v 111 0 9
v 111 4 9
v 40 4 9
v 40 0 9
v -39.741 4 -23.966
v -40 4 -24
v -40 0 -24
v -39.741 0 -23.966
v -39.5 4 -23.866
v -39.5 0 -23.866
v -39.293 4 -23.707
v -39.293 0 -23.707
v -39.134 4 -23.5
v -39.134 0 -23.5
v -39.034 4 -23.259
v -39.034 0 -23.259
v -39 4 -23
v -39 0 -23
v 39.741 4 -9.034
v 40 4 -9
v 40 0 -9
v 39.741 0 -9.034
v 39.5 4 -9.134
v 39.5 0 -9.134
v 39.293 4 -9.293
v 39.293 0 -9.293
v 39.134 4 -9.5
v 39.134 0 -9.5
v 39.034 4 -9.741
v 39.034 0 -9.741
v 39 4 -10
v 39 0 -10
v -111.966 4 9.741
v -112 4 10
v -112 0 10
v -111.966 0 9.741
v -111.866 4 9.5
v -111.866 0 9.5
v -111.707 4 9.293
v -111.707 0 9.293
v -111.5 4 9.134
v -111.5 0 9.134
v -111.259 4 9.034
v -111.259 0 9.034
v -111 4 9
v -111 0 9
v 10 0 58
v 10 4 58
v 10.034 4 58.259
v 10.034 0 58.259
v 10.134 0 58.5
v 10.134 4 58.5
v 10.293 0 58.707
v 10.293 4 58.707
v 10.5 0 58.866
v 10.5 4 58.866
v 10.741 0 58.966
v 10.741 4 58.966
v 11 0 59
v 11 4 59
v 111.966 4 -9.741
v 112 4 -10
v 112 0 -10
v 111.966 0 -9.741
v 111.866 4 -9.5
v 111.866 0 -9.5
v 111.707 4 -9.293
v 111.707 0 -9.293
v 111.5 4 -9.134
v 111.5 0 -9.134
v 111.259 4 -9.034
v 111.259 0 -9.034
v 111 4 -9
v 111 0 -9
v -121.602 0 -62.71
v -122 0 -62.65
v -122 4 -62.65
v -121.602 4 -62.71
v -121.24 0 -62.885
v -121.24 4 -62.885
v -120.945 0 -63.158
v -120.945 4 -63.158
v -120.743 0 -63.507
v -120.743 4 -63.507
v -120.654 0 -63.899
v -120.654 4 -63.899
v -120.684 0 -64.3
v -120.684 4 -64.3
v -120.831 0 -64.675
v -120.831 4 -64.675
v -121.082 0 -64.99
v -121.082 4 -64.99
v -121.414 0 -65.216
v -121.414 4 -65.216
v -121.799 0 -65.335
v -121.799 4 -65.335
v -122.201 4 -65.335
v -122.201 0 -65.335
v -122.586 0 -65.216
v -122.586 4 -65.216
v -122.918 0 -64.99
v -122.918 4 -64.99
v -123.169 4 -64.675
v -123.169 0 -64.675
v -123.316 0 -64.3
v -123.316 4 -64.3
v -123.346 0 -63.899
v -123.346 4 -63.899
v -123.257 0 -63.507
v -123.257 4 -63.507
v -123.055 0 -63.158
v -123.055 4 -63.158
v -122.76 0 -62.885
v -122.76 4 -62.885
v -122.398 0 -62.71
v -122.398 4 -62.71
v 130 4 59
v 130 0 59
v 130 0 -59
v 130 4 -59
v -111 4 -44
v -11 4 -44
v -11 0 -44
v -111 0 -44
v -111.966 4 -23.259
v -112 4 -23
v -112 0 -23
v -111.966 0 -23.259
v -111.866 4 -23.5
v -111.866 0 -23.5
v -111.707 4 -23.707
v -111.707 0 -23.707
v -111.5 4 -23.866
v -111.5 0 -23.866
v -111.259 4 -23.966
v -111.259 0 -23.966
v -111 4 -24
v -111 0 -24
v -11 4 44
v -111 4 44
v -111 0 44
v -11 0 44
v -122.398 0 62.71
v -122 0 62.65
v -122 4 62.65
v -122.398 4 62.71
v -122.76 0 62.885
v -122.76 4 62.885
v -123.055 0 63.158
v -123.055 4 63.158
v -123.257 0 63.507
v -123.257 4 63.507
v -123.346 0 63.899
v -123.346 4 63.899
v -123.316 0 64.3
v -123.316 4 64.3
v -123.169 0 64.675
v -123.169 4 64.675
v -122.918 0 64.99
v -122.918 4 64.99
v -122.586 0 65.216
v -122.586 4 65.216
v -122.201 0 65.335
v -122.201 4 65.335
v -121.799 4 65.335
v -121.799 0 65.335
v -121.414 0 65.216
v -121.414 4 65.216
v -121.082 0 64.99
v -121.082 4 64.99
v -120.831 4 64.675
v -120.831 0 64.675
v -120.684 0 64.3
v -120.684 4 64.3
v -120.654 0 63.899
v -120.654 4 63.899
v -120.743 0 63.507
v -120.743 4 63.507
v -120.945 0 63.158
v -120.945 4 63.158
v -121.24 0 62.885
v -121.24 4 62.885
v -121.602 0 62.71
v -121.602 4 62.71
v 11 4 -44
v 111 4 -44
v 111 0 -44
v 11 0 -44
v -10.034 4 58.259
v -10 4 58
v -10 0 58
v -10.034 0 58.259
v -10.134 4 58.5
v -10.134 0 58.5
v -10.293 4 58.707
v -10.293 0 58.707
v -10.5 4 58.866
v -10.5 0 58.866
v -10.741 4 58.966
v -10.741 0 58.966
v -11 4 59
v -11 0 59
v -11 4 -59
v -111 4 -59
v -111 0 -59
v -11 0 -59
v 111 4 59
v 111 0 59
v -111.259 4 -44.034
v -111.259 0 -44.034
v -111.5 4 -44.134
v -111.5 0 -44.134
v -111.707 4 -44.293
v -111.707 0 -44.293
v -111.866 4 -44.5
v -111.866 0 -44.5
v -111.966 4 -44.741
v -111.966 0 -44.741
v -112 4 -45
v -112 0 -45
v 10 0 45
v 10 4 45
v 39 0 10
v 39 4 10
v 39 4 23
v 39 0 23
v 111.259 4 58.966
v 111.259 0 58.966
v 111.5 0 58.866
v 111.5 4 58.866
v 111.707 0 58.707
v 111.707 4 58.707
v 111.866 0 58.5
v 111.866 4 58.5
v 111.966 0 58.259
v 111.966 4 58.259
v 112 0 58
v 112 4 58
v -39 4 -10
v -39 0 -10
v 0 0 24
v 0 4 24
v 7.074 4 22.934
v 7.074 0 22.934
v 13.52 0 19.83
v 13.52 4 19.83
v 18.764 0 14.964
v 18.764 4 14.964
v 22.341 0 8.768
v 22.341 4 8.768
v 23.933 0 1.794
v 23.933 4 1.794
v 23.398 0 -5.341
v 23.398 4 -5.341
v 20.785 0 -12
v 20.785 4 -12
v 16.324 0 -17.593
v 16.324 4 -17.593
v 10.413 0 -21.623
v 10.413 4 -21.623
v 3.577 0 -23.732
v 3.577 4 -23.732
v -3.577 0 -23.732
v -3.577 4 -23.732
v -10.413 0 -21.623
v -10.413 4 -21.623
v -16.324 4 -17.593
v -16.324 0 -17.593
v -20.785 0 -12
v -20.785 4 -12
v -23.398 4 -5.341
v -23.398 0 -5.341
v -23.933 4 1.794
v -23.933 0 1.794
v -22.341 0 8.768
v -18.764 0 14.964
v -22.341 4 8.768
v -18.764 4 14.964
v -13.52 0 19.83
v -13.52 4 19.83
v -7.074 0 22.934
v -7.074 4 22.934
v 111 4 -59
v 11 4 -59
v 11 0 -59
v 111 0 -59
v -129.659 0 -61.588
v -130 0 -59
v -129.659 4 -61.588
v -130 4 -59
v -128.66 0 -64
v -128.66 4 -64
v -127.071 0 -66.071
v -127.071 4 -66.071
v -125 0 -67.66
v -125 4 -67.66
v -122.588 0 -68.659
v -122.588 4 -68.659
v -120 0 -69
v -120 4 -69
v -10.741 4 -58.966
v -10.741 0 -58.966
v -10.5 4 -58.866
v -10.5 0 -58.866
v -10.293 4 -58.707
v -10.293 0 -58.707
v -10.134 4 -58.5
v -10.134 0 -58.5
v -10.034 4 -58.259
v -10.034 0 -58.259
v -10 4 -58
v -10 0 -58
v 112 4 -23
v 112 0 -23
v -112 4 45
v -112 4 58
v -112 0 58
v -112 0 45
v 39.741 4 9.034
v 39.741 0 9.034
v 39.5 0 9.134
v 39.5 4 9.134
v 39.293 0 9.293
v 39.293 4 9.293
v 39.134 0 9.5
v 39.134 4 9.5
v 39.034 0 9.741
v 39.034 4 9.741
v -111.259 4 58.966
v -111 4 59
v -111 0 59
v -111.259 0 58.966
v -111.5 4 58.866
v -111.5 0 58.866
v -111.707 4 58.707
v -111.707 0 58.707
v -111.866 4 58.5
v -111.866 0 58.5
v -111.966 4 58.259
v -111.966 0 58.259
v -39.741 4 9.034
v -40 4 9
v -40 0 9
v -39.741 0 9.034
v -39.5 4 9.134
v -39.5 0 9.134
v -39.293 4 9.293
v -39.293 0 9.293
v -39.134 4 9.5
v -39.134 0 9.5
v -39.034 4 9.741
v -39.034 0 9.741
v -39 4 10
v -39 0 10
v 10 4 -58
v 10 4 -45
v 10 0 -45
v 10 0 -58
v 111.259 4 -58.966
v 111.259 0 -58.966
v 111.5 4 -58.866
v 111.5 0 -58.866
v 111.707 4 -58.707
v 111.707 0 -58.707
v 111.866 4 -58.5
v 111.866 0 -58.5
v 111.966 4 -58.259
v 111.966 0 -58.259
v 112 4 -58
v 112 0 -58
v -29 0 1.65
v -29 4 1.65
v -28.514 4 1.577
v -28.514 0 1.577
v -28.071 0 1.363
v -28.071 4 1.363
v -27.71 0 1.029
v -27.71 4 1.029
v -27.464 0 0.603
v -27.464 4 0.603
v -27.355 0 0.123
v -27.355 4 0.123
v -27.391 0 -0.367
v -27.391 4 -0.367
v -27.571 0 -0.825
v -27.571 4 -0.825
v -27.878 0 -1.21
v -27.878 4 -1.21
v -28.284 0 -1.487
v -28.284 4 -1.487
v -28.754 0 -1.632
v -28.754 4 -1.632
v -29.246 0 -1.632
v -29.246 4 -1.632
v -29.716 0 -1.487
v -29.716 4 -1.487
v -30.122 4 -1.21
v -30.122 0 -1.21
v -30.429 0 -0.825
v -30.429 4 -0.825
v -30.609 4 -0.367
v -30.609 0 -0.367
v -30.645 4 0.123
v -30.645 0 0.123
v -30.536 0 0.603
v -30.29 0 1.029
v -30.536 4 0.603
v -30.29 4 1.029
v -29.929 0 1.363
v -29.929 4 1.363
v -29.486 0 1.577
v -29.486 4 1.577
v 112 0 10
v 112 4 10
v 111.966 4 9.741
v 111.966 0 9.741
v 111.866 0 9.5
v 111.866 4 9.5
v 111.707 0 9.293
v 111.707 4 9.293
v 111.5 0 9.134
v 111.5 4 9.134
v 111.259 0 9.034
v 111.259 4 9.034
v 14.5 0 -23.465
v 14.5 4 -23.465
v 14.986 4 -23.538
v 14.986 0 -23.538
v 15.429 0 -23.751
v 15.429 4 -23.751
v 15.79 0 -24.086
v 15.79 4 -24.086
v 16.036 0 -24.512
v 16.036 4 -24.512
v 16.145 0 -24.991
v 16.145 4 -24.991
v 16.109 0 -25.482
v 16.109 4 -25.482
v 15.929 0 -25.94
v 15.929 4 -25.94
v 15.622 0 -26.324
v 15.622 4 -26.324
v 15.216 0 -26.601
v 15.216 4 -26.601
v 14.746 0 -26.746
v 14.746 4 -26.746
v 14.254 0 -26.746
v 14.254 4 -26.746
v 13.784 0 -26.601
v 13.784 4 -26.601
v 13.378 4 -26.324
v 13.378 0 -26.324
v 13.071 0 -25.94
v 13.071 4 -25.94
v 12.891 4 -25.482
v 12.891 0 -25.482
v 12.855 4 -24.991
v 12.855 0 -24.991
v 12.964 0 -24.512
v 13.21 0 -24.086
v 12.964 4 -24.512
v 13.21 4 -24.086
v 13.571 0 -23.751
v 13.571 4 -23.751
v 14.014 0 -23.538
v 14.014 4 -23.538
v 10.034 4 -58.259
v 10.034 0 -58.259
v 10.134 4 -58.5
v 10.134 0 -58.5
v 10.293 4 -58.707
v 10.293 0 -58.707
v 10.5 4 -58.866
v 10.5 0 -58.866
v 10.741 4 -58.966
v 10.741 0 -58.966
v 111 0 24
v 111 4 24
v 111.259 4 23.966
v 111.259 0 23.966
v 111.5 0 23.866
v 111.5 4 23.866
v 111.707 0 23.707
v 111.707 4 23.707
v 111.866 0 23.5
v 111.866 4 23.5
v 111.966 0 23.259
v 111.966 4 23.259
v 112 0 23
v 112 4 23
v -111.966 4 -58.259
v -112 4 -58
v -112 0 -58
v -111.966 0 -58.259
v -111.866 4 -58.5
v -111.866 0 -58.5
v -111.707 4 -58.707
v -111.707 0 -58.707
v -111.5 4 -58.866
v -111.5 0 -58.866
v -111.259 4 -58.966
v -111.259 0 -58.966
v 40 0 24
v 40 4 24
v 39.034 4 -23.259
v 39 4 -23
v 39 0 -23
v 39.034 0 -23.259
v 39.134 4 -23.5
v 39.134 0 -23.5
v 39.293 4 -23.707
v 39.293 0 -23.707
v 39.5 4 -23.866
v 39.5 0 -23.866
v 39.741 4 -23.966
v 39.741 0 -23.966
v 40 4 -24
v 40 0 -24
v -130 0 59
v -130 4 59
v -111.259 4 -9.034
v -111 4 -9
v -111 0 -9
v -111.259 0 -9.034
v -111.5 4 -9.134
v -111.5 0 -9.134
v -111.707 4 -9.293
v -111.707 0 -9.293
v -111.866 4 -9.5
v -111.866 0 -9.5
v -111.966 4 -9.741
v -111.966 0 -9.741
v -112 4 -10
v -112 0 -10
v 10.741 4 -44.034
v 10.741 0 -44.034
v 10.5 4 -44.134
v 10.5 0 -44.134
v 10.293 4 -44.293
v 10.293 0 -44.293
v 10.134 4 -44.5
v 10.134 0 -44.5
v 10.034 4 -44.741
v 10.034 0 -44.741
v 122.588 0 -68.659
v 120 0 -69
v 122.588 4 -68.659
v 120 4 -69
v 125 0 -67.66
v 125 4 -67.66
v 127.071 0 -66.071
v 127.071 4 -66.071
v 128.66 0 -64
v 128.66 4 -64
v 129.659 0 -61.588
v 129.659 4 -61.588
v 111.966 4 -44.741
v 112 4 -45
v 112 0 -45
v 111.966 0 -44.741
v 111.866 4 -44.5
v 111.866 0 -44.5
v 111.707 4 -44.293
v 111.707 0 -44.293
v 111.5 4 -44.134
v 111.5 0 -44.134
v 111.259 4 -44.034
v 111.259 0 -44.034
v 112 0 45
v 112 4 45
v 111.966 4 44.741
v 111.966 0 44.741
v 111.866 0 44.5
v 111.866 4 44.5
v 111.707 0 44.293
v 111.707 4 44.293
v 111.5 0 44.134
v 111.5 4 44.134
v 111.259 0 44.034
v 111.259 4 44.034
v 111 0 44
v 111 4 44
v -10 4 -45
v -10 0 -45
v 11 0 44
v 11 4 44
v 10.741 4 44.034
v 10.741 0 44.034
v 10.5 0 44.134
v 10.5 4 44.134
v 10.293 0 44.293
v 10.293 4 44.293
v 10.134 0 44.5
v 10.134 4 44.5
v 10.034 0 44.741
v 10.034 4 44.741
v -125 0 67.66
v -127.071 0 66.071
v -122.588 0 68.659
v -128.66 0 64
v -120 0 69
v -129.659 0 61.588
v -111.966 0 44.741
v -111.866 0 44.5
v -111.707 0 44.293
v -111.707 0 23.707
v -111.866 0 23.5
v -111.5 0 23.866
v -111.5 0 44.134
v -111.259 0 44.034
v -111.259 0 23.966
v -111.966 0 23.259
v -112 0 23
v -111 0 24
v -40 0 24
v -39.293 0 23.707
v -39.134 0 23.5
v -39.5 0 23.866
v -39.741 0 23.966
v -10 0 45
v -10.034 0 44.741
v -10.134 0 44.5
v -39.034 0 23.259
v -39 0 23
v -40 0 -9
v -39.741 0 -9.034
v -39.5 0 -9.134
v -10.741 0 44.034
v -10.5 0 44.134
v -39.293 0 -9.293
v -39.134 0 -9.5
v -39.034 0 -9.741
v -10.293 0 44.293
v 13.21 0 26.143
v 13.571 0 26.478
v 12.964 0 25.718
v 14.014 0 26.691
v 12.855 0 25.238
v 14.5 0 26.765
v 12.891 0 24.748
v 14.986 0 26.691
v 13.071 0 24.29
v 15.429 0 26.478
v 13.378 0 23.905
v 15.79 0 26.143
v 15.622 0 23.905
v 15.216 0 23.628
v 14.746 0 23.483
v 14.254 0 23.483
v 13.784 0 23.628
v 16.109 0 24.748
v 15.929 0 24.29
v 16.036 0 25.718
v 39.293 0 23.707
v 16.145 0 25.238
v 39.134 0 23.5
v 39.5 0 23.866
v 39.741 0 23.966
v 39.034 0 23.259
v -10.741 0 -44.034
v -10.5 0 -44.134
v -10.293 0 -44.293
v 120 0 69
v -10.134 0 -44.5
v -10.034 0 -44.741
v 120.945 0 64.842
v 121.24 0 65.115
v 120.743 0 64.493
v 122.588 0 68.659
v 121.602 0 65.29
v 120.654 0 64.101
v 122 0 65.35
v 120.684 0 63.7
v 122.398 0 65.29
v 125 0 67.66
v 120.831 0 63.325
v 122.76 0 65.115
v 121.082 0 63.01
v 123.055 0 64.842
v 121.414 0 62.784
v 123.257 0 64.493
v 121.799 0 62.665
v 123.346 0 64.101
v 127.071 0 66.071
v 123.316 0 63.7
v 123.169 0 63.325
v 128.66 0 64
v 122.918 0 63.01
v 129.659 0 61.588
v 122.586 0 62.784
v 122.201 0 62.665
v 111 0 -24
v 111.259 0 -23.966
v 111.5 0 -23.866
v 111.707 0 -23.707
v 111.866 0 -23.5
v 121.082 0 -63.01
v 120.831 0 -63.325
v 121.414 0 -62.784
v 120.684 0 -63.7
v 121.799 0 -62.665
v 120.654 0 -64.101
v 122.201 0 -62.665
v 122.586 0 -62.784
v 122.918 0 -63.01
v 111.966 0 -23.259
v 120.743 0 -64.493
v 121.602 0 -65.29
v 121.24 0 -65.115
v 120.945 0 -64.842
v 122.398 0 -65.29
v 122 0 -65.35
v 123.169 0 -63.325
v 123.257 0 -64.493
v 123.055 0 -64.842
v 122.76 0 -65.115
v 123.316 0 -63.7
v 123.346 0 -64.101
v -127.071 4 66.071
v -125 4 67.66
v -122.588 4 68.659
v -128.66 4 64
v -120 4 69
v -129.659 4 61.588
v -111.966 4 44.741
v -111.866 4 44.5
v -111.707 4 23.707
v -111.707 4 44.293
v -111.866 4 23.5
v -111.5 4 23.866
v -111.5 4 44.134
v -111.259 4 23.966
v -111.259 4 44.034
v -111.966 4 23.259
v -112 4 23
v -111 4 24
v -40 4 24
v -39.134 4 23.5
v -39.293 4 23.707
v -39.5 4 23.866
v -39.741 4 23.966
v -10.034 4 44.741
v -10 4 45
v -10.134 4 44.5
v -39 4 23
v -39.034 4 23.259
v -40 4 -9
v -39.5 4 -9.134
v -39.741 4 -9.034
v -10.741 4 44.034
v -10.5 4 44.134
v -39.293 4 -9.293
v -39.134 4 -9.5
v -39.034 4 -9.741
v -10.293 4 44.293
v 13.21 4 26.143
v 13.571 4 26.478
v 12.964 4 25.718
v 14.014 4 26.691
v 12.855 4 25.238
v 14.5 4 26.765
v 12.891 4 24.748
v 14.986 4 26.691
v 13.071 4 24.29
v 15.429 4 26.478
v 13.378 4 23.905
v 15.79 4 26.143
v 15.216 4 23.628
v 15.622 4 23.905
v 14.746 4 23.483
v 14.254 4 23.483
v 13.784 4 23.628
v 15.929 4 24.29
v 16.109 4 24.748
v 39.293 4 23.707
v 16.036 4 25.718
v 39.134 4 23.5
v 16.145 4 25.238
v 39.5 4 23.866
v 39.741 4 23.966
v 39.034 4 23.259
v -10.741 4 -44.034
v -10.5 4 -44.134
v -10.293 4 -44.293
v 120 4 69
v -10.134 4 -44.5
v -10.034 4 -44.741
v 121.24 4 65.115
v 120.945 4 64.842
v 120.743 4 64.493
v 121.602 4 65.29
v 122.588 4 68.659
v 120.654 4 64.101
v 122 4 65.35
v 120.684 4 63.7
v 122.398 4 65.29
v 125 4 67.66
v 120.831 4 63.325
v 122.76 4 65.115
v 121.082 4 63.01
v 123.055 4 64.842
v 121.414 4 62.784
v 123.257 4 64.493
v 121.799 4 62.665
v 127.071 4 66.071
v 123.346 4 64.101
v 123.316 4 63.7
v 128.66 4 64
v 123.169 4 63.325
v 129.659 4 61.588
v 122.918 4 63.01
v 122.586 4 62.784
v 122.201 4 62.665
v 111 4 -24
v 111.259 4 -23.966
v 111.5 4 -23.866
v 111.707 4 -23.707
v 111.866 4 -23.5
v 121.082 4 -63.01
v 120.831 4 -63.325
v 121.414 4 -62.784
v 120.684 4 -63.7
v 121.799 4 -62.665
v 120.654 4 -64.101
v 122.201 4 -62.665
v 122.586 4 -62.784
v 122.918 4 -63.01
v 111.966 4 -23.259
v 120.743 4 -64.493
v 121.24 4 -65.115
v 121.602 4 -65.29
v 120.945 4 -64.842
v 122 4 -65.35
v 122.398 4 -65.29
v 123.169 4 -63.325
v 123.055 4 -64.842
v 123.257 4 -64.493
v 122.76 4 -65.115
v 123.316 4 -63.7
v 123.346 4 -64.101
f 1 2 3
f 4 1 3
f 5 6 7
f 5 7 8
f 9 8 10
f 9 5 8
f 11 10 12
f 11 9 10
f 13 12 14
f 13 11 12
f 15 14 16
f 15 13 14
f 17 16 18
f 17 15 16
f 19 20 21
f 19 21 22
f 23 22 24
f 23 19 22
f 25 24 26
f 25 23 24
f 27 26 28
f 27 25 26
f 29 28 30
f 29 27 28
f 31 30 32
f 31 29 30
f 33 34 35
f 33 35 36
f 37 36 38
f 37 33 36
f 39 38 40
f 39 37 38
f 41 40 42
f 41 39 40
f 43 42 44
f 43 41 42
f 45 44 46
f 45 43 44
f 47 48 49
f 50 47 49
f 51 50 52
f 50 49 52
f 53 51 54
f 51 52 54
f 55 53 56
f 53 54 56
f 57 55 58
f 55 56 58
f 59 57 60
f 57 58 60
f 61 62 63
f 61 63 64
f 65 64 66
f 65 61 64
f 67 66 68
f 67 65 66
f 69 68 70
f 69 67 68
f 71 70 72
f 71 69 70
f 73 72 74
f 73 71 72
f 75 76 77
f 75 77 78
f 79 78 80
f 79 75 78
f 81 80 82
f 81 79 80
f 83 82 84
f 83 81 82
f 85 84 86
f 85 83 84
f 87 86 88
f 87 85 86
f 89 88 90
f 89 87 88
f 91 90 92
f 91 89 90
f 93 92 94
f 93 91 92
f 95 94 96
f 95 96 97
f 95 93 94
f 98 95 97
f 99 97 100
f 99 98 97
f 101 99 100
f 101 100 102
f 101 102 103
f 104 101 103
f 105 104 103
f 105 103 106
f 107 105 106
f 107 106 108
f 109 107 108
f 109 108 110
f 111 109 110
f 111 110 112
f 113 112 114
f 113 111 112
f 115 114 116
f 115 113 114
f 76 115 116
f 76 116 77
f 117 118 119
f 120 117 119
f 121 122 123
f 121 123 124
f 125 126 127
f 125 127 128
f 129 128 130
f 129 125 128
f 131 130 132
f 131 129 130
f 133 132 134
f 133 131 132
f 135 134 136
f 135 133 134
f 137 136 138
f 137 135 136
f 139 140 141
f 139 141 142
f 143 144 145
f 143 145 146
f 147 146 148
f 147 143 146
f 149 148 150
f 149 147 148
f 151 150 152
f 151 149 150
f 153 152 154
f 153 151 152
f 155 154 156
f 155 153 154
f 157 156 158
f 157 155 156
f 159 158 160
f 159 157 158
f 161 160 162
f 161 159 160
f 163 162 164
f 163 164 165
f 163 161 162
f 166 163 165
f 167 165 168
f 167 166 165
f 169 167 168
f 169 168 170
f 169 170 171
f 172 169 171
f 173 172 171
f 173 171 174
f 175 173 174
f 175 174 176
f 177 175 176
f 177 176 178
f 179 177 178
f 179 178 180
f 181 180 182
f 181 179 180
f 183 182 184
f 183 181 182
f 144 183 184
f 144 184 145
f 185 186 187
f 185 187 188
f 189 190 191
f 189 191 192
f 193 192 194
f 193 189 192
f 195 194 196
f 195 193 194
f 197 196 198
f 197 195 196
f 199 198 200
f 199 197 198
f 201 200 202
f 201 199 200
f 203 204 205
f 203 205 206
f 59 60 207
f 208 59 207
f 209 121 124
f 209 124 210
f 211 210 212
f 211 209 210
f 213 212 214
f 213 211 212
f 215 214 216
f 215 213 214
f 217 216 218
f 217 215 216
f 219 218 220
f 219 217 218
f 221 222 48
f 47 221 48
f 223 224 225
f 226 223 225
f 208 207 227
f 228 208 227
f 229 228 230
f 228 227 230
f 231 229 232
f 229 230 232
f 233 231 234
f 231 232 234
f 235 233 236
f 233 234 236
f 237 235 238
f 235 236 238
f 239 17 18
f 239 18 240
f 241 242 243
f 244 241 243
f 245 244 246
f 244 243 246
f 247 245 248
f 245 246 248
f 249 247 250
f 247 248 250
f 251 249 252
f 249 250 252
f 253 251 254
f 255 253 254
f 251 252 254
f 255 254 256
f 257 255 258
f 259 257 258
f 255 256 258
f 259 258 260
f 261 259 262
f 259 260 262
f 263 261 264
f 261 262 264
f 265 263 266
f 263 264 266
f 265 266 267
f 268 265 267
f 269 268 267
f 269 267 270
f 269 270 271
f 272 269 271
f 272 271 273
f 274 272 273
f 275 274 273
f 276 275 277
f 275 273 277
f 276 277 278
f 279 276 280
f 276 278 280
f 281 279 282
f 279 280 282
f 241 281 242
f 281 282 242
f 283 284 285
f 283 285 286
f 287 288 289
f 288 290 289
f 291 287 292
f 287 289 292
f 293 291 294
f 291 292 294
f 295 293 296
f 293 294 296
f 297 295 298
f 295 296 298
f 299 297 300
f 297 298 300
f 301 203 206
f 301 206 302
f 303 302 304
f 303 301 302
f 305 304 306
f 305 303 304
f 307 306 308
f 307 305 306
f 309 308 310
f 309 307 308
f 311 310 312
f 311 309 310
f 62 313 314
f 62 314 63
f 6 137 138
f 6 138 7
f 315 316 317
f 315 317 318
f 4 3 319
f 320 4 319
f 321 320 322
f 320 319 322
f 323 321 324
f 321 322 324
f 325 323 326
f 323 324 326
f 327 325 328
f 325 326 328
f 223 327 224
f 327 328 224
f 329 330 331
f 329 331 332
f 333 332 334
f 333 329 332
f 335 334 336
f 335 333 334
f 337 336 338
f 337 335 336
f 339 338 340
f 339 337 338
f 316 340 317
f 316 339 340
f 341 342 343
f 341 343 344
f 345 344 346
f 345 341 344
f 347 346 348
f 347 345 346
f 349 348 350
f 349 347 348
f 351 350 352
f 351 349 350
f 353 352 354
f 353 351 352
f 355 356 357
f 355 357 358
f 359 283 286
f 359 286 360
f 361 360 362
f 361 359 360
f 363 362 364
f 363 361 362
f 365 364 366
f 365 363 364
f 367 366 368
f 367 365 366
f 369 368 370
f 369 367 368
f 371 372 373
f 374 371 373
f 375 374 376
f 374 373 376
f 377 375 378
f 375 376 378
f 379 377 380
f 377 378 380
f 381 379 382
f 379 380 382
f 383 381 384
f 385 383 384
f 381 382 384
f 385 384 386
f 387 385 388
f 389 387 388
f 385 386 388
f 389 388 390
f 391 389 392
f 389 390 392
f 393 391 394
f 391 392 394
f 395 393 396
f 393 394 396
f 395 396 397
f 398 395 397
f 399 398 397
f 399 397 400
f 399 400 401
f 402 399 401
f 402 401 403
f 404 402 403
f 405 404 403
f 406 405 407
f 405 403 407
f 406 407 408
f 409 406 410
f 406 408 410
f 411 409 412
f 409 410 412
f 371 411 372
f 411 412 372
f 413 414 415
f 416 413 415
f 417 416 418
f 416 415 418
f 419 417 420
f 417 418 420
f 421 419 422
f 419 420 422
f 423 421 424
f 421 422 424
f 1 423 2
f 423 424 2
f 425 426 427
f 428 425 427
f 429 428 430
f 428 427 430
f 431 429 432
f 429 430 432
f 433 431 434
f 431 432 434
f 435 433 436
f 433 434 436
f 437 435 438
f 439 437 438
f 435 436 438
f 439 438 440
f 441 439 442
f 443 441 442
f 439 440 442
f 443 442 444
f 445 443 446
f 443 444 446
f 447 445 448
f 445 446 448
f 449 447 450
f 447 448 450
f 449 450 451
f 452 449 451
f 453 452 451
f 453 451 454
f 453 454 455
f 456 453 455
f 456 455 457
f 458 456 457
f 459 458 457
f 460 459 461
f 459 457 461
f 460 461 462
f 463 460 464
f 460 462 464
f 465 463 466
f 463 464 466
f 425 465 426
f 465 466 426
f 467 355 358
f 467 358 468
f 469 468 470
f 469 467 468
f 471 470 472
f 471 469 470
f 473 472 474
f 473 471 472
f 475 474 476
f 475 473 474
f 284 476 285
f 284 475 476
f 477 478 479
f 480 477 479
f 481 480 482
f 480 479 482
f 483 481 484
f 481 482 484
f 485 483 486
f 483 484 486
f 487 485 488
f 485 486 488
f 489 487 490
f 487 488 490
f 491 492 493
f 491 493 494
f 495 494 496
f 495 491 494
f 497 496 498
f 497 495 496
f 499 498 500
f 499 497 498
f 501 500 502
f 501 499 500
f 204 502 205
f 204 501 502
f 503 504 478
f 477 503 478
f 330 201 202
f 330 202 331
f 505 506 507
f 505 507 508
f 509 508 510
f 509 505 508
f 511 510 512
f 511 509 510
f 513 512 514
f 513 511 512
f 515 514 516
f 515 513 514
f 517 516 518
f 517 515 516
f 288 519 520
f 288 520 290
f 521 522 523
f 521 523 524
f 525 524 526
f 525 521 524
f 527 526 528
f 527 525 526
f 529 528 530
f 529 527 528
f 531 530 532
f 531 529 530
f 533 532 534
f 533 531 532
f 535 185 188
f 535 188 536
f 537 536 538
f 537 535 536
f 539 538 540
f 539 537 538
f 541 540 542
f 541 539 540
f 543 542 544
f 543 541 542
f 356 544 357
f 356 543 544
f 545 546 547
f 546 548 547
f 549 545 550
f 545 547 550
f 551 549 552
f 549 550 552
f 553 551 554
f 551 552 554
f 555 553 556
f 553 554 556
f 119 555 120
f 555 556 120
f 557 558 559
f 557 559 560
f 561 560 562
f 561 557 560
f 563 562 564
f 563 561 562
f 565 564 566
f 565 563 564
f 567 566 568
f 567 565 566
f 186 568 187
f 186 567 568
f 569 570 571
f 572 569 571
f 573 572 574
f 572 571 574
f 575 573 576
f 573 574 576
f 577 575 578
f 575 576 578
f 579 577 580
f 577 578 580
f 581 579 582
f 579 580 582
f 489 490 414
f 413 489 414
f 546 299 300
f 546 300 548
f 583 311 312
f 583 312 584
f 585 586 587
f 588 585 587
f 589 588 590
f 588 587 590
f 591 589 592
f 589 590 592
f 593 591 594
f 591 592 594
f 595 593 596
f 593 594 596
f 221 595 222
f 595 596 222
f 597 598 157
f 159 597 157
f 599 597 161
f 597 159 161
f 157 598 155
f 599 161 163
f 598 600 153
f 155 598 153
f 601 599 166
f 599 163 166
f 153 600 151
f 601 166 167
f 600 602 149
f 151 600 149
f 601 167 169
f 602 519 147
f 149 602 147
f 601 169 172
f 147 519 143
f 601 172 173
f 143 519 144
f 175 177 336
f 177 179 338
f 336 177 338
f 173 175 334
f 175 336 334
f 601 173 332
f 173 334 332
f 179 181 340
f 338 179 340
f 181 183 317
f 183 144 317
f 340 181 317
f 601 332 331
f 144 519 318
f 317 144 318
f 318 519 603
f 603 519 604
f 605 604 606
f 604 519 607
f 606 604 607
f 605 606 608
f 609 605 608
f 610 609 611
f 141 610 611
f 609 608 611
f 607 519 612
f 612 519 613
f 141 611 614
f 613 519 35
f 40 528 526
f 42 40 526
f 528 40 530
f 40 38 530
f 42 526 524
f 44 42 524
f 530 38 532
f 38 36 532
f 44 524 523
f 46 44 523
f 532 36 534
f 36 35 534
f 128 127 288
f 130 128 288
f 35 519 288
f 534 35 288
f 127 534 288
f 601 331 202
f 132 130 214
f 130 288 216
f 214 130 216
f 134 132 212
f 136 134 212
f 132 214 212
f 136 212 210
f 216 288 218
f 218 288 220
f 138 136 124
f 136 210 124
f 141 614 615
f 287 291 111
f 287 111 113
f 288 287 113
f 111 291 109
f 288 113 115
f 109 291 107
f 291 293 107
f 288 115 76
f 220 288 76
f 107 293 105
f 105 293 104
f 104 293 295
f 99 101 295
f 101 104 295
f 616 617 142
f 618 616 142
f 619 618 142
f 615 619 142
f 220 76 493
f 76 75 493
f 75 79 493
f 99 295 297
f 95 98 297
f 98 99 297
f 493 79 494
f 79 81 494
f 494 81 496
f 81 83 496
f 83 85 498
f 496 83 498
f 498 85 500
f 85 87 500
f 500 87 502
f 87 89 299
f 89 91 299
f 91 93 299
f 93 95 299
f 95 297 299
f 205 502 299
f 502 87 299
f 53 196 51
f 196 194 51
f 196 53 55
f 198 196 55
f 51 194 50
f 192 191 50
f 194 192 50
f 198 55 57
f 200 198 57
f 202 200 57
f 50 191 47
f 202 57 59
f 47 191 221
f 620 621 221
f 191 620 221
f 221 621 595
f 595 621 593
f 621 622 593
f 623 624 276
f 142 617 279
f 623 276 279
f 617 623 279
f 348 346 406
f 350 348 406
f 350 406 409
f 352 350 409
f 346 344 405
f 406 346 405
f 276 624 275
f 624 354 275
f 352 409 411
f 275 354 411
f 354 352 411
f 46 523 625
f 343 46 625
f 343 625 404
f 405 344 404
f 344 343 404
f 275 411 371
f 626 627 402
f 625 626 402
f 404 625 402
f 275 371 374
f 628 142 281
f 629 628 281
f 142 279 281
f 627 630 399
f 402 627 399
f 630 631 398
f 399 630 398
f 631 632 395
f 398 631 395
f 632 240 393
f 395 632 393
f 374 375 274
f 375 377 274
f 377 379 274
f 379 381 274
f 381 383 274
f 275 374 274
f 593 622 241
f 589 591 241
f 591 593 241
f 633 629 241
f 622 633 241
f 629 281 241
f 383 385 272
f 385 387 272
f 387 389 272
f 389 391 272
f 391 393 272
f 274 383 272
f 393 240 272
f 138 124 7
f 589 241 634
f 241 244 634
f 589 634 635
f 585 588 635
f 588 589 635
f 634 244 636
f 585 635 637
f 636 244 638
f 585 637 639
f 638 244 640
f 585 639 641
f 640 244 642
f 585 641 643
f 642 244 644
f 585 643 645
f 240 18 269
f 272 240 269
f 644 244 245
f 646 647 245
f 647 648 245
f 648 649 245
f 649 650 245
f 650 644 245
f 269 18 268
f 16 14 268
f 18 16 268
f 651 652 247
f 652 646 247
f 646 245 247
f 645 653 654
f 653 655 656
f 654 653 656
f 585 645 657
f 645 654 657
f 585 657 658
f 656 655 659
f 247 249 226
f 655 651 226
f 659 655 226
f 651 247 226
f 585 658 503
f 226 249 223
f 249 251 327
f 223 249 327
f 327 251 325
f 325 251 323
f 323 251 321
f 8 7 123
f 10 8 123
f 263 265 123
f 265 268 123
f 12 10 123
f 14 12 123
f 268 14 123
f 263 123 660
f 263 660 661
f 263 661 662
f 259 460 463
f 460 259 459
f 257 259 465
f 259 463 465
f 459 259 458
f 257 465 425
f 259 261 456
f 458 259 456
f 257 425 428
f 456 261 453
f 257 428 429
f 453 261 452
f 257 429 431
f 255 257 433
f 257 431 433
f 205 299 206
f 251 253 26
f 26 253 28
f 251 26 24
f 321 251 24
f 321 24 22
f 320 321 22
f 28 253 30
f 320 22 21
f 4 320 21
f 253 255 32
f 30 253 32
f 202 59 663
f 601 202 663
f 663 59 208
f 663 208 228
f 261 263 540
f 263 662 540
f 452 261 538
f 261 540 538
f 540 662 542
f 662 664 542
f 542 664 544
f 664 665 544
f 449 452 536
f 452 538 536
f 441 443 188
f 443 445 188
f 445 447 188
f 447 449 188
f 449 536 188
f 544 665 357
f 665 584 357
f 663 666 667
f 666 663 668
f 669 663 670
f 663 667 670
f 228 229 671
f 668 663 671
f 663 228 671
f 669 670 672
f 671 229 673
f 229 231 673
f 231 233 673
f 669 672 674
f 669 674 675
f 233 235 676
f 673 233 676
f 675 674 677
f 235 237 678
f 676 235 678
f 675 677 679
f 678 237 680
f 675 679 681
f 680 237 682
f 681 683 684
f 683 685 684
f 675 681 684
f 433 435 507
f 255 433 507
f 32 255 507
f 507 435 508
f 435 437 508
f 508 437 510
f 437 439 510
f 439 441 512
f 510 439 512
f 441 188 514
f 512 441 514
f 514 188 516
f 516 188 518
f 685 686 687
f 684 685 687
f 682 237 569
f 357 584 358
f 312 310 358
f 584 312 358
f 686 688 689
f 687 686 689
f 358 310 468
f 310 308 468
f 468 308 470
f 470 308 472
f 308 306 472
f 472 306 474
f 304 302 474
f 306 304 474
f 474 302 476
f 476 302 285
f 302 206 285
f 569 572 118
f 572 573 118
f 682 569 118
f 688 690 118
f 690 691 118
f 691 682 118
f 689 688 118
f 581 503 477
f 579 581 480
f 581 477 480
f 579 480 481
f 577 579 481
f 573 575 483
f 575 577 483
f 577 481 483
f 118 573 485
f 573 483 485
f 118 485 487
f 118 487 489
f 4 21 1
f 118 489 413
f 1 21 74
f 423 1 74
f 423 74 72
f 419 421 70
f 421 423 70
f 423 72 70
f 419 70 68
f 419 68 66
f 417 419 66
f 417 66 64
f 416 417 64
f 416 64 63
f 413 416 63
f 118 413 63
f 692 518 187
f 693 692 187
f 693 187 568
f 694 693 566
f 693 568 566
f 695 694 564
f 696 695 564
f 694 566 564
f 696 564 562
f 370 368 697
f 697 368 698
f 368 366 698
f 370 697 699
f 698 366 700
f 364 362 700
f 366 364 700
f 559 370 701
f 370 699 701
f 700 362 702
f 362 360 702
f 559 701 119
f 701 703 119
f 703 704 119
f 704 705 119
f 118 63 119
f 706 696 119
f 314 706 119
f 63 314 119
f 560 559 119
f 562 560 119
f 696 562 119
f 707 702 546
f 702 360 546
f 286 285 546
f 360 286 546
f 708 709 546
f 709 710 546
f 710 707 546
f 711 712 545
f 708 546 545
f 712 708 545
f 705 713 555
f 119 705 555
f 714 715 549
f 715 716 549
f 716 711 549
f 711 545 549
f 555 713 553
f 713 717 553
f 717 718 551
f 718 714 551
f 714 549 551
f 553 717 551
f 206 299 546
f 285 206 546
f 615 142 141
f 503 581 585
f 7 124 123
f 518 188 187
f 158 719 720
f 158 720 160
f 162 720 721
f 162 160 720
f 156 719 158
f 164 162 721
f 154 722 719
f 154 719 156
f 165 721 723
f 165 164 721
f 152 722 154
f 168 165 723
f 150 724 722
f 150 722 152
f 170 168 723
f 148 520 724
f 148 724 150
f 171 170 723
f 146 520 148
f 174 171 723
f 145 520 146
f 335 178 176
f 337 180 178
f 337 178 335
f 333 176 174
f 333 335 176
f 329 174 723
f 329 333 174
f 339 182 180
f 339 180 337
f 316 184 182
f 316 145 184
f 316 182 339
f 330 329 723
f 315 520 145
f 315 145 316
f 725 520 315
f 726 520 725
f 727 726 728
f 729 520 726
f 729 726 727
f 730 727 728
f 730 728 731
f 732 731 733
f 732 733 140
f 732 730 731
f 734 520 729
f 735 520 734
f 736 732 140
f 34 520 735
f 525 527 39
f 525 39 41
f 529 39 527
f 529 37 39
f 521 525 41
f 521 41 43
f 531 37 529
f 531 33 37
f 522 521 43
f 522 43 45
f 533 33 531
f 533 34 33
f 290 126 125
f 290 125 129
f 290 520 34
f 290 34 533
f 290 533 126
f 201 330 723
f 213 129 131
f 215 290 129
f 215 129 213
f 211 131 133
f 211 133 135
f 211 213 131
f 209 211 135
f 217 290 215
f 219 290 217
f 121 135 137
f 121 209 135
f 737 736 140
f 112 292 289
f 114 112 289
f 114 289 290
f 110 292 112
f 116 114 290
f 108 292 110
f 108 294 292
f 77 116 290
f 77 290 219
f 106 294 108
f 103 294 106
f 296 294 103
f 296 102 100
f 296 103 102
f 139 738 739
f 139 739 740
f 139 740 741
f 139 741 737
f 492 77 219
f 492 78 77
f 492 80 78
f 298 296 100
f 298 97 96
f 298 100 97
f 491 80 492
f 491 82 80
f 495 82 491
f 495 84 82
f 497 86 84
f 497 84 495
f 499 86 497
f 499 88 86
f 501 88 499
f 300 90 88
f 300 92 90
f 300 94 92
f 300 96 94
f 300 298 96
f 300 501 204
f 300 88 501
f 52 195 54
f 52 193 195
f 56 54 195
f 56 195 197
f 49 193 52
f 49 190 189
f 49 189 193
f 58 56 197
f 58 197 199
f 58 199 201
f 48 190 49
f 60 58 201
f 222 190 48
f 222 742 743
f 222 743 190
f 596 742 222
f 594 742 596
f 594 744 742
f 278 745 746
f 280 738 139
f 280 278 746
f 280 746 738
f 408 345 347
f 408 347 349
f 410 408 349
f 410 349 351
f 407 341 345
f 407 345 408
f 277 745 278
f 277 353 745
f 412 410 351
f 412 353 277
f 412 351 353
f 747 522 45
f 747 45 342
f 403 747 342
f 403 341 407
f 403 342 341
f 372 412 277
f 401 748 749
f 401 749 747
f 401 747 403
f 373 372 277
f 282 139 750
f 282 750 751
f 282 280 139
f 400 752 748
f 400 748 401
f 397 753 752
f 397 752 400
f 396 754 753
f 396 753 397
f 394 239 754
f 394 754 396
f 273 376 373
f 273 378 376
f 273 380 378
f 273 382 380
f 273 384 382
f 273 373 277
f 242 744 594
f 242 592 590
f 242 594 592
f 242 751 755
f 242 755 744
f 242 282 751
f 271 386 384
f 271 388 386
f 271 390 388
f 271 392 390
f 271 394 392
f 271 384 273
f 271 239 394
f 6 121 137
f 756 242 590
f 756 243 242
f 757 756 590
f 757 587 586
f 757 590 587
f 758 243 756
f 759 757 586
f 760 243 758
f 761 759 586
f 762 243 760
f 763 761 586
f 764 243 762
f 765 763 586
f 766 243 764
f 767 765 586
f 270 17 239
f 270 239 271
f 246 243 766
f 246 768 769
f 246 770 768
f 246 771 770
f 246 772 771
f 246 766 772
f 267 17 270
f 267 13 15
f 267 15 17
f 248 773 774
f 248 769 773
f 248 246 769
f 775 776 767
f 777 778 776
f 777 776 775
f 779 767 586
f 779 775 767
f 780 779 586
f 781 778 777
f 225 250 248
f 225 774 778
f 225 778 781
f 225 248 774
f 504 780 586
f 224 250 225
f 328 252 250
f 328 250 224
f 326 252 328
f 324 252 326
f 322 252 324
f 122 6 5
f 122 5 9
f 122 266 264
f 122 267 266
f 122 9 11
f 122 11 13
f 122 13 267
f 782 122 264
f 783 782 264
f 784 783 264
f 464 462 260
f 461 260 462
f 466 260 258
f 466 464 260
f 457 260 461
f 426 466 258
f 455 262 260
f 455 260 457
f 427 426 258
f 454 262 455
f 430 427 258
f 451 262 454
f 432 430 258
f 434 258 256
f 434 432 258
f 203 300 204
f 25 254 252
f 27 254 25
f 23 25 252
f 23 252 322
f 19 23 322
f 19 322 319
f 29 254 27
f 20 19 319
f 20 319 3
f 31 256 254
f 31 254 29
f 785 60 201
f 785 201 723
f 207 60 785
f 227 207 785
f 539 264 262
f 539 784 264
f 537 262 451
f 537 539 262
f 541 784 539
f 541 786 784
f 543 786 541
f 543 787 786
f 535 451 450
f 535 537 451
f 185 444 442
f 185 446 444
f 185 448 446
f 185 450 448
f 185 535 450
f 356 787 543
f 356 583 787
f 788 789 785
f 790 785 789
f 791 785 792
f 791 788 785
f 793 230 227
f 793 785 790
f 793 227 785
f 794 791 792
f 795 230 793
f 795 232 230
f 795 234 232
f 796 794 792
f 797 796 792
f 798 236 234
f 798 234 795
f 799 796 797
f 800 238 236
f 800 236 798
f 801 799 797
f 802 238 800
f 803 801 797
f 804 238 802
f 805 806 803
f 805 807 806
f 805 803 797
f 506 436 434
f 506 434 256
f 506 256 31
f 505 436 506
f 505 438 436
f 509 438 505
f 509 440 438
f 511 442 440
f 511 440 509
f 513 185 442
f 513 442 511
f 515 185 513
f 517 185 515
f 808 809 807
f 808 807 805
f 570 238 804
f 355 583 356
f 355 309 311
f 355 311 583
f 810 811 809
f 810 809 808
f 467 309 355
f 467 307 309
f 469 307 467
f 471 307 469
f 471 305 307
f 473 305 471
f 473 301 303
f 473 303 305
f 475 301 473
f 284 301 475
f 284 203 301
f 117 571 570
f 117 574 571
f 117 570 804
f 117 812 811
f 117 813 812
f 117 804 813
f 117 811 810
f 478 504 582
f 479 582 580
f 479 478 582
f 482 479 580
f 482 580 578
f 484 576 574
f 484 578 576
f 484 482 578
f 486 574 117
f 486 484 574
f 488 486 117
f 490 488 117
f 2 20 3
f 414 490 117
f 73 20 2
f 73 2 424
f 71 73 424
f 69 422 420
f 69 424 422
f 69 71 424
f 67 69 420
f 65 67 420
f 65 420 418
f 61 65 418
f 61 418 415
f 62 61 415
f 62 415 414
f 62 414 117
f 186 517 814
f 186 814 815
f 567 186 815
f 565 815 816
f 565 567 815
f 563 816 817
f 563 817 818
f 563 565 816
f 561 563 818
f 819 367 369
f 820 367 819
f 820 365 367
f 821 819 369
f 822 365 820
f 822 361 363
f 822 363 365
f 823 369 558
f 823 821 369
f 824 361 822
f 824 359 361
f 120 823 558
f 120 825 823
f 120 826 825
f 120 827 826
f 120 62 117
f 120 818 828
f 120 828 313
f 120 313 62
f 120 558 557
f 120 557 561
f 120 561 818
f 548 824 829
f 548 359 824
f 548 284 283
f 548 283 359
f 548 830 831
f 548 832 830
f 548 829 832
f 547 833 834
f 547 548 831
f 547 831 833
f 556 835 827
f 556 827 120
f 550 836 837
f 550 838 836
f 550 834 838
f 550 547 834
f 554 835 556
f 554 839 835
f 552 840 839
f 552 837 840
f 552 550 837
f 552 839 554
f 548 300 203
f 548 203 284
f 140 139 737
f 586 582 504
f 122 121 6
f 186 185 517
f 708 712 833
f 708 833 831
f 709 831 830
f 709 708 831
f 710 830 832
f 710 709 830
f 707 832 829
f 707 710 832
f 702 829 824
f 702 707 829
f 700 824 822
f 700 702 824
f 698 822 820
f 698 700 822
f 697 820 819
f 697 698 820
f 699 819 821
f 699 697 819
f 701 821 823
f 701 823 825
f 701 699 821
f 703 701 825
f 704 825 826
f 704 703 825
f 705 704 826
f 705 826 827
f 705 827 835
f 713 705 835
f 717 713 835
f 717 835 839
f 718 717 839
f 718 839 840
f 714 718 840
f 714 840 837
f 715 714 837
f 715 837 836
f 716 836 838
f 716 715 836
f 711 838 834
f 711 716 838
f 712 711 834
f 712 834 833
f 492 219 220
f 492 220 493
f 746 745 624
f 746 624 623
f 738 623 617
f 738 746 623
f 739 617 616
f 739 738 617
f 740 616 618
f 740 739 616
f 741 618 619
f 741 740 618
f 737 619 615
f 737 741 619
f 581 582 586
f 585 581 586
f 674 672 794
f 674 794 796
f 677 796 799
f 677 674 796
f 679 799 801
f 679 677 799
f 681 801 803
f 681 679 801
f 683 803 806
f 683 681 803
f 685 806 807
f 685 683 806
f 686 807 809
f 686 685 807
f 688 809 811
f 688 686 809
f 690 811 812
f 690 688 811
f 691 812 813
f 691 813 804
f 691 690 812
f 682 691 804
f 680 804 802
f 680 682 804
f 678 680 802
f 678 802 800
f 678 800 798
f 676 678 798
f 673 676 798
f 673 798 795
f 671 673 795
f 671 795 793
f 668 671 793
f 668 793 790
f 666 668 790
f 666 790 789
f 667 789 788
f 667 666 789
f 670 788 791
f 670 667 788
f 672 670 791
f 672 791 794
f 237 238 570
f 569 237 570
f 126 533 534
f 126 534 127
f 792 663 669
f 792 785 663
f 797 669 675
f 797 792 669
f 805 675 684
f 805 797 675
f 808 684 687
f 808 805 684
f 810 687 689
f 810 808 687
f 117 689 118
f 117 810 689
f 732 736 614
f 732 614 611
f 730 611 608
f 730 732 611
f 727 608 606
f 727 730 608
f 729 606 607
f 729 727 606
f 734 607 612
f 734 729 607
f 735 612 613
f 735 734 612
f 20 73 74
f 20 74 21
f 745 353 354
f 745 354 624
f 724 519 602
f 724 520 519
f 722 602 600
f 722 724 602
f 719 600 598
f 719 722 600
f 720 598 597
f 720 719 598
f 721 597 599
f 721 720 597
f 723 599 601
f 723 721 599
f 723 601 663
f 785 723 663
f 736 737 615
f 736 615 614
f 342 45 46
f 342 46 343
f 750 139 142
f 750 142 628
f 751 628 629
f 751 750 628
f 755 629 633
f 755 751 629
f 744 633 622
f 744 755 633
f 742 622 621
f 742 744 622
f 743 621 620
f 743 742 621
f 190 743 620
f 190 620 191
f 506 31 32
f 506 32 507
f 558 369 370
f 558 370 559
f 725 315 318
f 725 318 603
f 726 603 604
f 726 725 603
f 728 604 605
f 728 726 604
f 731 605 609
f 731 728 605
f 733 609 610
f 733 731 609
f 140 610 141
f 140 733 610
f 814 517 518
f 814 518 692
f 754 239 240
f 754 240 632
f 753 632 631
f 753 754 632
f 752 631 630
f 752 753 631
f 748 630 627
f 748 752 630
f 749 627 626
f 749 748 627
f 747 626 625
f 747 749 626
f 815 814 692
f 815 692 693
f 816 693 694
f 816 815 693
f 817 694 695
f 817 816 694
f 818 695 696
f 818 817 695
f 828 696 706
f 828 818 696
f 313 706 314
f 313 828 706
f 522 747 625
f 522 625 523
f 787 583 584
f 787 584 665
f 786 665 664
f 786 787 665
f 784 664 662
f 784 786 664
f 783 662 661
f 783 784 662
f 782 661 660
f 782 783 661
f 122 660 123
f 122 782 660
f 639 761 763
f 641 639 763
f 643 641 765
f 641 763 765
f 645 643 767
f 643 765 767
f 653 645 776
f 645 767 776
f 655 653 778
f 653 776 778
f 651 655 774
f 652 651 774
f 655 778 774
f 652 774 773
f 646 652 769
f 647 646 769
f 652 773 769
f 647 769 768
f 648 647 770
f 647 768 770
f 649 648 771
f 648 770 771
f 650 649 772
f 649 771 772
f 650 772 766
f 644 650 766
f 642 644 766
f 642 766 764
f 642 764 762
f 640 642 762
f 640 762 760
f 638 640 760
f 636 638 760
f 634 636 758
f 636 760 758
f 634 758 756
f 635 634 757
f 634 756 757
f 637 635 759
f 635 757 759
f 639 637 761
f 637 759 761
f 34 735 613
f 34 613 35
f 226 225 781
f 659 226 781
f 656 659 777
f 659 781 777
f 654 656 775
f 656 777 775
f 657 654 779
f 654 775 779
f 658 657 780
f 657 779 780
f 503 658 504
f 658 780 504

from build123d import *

# Parameters (mm, degrees)
SKETCH_1_W          = 260
SKETCH_1_H          = 138
SKETCH_1_R          = 1.35
EXTRUDE_1_DEPTH     = 4
SKETCH_3_R          = 24
SKETCH_3_R_2        = 1.65
CUT_EXTRUDE_1_DEPTH = 4
CUT_EXTRUDE_3_DEPTH = 4
FILLET_1_R          = 10


with BuildPart() as part:
    # 草图1 → 凸台-拉伸1 (new body)
    with BuildSketch(Plane(origin=(0, 0, 0), x_dir=(1, 0, 0), z_dir=(0, 1, 0))):
        Rectangle(SKETCH_1_W, SKETCH_1_H)
        with Locations(Location((-122, 64, 0), (0, 0, 270))):
            Circle(SKETCH_1_R, mode=Mode.SUBTRACT)
        with Locations(Location((122, 64, 0), (0, 0, 90))):
            Circle(SKETCH_1_R, mode=Mode.SUBTRACT)
        with Locations(Location((122, -64, 0), (0, 0, 270))):
            Circle(SKETCH_1_R, mode=Mode.SUBTRACT)
        with Locations(Location((-122, -64, 0), (0, 0, 90))):
            Circle(SKETCH_1_R, mode=Mode.SUBTRACT)
    extrude(amount=EXTRUDE_1_DEPTH)

    # 草图3 → 切除-拉伸1 (cut)
    with BuildSketch(Plane(origin=(0, 4, 0), x_dir=(1, 0, 0), z_dir=(0, 1, 0))):
        with Locations(Location((0, 0, 0), (0, 0, 270))):
            Circle(SKETCH_3_R)
        with Locations(Location((-29, 0, 0), (0, 0, 270))):
            Circle(SKETCH_3_R_2)
        with Locations(Location((14.5, 25.11473671, 0), (0, 0, 270))):
            Circle(SKETCH_3_R_2)
        with Locations(Location((14.5, -25.11473671, 0), (0, 0, 270))):
            Circle(SKETCH_3_R_2)
    extrude(amount=-CUT_EXTRUDE_1_DEPTH, mode=Mode.SUBTRACT)

    # 草图4 → 切除-拉伸3 (cut)
    with BuildSketch(Plane(origin=(0, 4, 0), x_dir=(1, 0, 0), z_dir=(0, 1, 0))):
        with BuildLine():
            Line((-111, 59), (-11, 59))
            ThreePointArc((-11, 59), (-10.292893219, 58.707106781), (-10, 58))
            Line((-10, 58), (-10, 45))
            ThreePointArc((-10, 45), (-10.292893219, 44.292893219), (-11, 44))
            Line((-11, 44), (-111, 44))
            ThreePointArc((-111, 44), (-111.707106781, 44.292893219), (-112, 45))
            Line((-112, 45), (-112, 58))
            ThreePointArc((-112, 58), (-111.707106781, 58.707106781), (-111, 59))
        make_face()
        with BuildLine():
            Line((-111, 24), (-40, 24))
            ThreePointArc((-40, 24), (-39.292893219, 23.707106781), (-39, 23))
            Line((-39, 23), (-39, 10))
            ThreePointArc((-39, 10), (-39.292893219, 9.292893219), (-40, 9))
            Line((-40, 9), (-111, 9))
            ThreePointArc((-111, 9), (-111.707106781, 9.292893219), (-112, 10))
            Line((-112, 10), (-112, 23))
            ThreePointArc((-112, 23), (-111.707106781, 23.707106781), (-111, 24))
        make_face()
        with BuildLine():
            Line((111, 9), (40, 9))
            ThreePointArc((40, 9), (39.292893219, 9.292893219), (39, 10))
            Line((39, 10), (39, 23))
            ThreePointArc((39, 23), (39.292893219, 23.707106781), (40, 24))
            Line((40, 24), (111, 24))
            ThreePointArc((111, 24), (111.707106781, 23.707106781), (112, 23))
            Line((112, 23), (112, 10))
            ThreePointArc((112, 10), (111.707106781, 9.292893219), (111, 9))
        make_face()
        with BuildLine():
            Line((111, 44), (11, 44))
            ThreePointArc((11, 44), (10.292893219, 44.292893219), (10, 45))
            Line((10, 45), (10, 58))
            ThreePointArc((10, 58), (10.292893219, 58.707106781), (11, 59))
            Line((11, 59), (111, 59))
            ThreePointArc((111, 59), (111.707106781, 58.707106781), (112, 58))
            Line((112, 58), (112, 45))
            ThreePointArc((112, 45), (111.707106781, 44.292893219), (111, 44))
        make_face()
        with BuildLine():
            Line((111, -9), (40, -9))
            ThreePointArc((40, -9), (39.292893219, -9.292893219), (39, -10))
            Line((39, -10), (39, -23))
            ThreePointArc((39, -23), (39.292893219, -23.707106781), (40, -24))
            Line((40, -24), (111, -24))
            ThreePointArc((111, -24), (111.707106781, -23.707106781), (112, -23))
            Line((112, -23), (112, -10))
            ThreePointArc((112, -10), (111.707106781, -9.292893219), (111, -9))
        make_face()
        with BuildLine():
            Line((-111, -9), (-40, -9))
            ThreePointArc((-40, -9), (-39.292893219, -9.292893219), (-39, -10))
            Line((-39, -10), (-39, -23))
            ThreePointArc((-39, -23), (-39.292893219, -23.707106781), (-40, -24))
            Line((-40, -24), (-111, -24))
            ThreePointArc((-111, -24), (-111.707106781, -23.707106781), (-112, -23))
            Line((-112, -23), (-112, -10))
            ThreePointArc((-112, -10), (-111.707106781, -9.292893219), (-111, -9))
        make_face()
        with BuildLine():
            Line((111, -44), (11, -44))
            ThreePointArc((11, -44), (10.292893219, -44.292893219), (10, -45))
            Line((10, -45), (10, -58))
            ThreePointArc((10, -58), (10.292893219, -58.707106781), (11, -59))
            Line((11, -59), (111, -59))
            ThreePointArc((111, -59), (111.707106781, -58.707106781), (112, -58))
            Line((112, -58), (112, -45))
            ThreePointArc((112, -45), (111.707106781, -44.292893219), (111, -44))
        make_face()
        with BuildLine():
            Line((-111, -44), (-11, -44))
            ThreePointArc((-11, -44), (-10.292893219, -44.292893219), (-10, -45))
            Line((-10, -45), (-10, -58))
            ThreePointArc((-10, -58), (-10.292893219, -58.707106781), (-11, -59))
            Line((-11, -59), (-111, -59))
            ThreePointArc((-111, -59), (-111.707106781, -58.707106781), (-112, -58))
            Line((-112, -58), (-112, -45))
            ThreePointArc((-112, -45), (-111.707106781, -44.292893219), (-111, -44))
        make_face()
    extrude(amount=-CUT_EXTRUDE_3_DEPTH, mode=Mode.SUBTRACT)

    # 圆角1
    fillet_1_edges = [part.edges().sort_by_distance(p)[0] for p in [
        (130, 2, 69),
        (-130, 2, 69),
        (-130, 2, -69),
        (130, 2, -69),
    ]]
    fillet(fillet_1_edges, radius=FILLET_1_R)


solid = part.part
